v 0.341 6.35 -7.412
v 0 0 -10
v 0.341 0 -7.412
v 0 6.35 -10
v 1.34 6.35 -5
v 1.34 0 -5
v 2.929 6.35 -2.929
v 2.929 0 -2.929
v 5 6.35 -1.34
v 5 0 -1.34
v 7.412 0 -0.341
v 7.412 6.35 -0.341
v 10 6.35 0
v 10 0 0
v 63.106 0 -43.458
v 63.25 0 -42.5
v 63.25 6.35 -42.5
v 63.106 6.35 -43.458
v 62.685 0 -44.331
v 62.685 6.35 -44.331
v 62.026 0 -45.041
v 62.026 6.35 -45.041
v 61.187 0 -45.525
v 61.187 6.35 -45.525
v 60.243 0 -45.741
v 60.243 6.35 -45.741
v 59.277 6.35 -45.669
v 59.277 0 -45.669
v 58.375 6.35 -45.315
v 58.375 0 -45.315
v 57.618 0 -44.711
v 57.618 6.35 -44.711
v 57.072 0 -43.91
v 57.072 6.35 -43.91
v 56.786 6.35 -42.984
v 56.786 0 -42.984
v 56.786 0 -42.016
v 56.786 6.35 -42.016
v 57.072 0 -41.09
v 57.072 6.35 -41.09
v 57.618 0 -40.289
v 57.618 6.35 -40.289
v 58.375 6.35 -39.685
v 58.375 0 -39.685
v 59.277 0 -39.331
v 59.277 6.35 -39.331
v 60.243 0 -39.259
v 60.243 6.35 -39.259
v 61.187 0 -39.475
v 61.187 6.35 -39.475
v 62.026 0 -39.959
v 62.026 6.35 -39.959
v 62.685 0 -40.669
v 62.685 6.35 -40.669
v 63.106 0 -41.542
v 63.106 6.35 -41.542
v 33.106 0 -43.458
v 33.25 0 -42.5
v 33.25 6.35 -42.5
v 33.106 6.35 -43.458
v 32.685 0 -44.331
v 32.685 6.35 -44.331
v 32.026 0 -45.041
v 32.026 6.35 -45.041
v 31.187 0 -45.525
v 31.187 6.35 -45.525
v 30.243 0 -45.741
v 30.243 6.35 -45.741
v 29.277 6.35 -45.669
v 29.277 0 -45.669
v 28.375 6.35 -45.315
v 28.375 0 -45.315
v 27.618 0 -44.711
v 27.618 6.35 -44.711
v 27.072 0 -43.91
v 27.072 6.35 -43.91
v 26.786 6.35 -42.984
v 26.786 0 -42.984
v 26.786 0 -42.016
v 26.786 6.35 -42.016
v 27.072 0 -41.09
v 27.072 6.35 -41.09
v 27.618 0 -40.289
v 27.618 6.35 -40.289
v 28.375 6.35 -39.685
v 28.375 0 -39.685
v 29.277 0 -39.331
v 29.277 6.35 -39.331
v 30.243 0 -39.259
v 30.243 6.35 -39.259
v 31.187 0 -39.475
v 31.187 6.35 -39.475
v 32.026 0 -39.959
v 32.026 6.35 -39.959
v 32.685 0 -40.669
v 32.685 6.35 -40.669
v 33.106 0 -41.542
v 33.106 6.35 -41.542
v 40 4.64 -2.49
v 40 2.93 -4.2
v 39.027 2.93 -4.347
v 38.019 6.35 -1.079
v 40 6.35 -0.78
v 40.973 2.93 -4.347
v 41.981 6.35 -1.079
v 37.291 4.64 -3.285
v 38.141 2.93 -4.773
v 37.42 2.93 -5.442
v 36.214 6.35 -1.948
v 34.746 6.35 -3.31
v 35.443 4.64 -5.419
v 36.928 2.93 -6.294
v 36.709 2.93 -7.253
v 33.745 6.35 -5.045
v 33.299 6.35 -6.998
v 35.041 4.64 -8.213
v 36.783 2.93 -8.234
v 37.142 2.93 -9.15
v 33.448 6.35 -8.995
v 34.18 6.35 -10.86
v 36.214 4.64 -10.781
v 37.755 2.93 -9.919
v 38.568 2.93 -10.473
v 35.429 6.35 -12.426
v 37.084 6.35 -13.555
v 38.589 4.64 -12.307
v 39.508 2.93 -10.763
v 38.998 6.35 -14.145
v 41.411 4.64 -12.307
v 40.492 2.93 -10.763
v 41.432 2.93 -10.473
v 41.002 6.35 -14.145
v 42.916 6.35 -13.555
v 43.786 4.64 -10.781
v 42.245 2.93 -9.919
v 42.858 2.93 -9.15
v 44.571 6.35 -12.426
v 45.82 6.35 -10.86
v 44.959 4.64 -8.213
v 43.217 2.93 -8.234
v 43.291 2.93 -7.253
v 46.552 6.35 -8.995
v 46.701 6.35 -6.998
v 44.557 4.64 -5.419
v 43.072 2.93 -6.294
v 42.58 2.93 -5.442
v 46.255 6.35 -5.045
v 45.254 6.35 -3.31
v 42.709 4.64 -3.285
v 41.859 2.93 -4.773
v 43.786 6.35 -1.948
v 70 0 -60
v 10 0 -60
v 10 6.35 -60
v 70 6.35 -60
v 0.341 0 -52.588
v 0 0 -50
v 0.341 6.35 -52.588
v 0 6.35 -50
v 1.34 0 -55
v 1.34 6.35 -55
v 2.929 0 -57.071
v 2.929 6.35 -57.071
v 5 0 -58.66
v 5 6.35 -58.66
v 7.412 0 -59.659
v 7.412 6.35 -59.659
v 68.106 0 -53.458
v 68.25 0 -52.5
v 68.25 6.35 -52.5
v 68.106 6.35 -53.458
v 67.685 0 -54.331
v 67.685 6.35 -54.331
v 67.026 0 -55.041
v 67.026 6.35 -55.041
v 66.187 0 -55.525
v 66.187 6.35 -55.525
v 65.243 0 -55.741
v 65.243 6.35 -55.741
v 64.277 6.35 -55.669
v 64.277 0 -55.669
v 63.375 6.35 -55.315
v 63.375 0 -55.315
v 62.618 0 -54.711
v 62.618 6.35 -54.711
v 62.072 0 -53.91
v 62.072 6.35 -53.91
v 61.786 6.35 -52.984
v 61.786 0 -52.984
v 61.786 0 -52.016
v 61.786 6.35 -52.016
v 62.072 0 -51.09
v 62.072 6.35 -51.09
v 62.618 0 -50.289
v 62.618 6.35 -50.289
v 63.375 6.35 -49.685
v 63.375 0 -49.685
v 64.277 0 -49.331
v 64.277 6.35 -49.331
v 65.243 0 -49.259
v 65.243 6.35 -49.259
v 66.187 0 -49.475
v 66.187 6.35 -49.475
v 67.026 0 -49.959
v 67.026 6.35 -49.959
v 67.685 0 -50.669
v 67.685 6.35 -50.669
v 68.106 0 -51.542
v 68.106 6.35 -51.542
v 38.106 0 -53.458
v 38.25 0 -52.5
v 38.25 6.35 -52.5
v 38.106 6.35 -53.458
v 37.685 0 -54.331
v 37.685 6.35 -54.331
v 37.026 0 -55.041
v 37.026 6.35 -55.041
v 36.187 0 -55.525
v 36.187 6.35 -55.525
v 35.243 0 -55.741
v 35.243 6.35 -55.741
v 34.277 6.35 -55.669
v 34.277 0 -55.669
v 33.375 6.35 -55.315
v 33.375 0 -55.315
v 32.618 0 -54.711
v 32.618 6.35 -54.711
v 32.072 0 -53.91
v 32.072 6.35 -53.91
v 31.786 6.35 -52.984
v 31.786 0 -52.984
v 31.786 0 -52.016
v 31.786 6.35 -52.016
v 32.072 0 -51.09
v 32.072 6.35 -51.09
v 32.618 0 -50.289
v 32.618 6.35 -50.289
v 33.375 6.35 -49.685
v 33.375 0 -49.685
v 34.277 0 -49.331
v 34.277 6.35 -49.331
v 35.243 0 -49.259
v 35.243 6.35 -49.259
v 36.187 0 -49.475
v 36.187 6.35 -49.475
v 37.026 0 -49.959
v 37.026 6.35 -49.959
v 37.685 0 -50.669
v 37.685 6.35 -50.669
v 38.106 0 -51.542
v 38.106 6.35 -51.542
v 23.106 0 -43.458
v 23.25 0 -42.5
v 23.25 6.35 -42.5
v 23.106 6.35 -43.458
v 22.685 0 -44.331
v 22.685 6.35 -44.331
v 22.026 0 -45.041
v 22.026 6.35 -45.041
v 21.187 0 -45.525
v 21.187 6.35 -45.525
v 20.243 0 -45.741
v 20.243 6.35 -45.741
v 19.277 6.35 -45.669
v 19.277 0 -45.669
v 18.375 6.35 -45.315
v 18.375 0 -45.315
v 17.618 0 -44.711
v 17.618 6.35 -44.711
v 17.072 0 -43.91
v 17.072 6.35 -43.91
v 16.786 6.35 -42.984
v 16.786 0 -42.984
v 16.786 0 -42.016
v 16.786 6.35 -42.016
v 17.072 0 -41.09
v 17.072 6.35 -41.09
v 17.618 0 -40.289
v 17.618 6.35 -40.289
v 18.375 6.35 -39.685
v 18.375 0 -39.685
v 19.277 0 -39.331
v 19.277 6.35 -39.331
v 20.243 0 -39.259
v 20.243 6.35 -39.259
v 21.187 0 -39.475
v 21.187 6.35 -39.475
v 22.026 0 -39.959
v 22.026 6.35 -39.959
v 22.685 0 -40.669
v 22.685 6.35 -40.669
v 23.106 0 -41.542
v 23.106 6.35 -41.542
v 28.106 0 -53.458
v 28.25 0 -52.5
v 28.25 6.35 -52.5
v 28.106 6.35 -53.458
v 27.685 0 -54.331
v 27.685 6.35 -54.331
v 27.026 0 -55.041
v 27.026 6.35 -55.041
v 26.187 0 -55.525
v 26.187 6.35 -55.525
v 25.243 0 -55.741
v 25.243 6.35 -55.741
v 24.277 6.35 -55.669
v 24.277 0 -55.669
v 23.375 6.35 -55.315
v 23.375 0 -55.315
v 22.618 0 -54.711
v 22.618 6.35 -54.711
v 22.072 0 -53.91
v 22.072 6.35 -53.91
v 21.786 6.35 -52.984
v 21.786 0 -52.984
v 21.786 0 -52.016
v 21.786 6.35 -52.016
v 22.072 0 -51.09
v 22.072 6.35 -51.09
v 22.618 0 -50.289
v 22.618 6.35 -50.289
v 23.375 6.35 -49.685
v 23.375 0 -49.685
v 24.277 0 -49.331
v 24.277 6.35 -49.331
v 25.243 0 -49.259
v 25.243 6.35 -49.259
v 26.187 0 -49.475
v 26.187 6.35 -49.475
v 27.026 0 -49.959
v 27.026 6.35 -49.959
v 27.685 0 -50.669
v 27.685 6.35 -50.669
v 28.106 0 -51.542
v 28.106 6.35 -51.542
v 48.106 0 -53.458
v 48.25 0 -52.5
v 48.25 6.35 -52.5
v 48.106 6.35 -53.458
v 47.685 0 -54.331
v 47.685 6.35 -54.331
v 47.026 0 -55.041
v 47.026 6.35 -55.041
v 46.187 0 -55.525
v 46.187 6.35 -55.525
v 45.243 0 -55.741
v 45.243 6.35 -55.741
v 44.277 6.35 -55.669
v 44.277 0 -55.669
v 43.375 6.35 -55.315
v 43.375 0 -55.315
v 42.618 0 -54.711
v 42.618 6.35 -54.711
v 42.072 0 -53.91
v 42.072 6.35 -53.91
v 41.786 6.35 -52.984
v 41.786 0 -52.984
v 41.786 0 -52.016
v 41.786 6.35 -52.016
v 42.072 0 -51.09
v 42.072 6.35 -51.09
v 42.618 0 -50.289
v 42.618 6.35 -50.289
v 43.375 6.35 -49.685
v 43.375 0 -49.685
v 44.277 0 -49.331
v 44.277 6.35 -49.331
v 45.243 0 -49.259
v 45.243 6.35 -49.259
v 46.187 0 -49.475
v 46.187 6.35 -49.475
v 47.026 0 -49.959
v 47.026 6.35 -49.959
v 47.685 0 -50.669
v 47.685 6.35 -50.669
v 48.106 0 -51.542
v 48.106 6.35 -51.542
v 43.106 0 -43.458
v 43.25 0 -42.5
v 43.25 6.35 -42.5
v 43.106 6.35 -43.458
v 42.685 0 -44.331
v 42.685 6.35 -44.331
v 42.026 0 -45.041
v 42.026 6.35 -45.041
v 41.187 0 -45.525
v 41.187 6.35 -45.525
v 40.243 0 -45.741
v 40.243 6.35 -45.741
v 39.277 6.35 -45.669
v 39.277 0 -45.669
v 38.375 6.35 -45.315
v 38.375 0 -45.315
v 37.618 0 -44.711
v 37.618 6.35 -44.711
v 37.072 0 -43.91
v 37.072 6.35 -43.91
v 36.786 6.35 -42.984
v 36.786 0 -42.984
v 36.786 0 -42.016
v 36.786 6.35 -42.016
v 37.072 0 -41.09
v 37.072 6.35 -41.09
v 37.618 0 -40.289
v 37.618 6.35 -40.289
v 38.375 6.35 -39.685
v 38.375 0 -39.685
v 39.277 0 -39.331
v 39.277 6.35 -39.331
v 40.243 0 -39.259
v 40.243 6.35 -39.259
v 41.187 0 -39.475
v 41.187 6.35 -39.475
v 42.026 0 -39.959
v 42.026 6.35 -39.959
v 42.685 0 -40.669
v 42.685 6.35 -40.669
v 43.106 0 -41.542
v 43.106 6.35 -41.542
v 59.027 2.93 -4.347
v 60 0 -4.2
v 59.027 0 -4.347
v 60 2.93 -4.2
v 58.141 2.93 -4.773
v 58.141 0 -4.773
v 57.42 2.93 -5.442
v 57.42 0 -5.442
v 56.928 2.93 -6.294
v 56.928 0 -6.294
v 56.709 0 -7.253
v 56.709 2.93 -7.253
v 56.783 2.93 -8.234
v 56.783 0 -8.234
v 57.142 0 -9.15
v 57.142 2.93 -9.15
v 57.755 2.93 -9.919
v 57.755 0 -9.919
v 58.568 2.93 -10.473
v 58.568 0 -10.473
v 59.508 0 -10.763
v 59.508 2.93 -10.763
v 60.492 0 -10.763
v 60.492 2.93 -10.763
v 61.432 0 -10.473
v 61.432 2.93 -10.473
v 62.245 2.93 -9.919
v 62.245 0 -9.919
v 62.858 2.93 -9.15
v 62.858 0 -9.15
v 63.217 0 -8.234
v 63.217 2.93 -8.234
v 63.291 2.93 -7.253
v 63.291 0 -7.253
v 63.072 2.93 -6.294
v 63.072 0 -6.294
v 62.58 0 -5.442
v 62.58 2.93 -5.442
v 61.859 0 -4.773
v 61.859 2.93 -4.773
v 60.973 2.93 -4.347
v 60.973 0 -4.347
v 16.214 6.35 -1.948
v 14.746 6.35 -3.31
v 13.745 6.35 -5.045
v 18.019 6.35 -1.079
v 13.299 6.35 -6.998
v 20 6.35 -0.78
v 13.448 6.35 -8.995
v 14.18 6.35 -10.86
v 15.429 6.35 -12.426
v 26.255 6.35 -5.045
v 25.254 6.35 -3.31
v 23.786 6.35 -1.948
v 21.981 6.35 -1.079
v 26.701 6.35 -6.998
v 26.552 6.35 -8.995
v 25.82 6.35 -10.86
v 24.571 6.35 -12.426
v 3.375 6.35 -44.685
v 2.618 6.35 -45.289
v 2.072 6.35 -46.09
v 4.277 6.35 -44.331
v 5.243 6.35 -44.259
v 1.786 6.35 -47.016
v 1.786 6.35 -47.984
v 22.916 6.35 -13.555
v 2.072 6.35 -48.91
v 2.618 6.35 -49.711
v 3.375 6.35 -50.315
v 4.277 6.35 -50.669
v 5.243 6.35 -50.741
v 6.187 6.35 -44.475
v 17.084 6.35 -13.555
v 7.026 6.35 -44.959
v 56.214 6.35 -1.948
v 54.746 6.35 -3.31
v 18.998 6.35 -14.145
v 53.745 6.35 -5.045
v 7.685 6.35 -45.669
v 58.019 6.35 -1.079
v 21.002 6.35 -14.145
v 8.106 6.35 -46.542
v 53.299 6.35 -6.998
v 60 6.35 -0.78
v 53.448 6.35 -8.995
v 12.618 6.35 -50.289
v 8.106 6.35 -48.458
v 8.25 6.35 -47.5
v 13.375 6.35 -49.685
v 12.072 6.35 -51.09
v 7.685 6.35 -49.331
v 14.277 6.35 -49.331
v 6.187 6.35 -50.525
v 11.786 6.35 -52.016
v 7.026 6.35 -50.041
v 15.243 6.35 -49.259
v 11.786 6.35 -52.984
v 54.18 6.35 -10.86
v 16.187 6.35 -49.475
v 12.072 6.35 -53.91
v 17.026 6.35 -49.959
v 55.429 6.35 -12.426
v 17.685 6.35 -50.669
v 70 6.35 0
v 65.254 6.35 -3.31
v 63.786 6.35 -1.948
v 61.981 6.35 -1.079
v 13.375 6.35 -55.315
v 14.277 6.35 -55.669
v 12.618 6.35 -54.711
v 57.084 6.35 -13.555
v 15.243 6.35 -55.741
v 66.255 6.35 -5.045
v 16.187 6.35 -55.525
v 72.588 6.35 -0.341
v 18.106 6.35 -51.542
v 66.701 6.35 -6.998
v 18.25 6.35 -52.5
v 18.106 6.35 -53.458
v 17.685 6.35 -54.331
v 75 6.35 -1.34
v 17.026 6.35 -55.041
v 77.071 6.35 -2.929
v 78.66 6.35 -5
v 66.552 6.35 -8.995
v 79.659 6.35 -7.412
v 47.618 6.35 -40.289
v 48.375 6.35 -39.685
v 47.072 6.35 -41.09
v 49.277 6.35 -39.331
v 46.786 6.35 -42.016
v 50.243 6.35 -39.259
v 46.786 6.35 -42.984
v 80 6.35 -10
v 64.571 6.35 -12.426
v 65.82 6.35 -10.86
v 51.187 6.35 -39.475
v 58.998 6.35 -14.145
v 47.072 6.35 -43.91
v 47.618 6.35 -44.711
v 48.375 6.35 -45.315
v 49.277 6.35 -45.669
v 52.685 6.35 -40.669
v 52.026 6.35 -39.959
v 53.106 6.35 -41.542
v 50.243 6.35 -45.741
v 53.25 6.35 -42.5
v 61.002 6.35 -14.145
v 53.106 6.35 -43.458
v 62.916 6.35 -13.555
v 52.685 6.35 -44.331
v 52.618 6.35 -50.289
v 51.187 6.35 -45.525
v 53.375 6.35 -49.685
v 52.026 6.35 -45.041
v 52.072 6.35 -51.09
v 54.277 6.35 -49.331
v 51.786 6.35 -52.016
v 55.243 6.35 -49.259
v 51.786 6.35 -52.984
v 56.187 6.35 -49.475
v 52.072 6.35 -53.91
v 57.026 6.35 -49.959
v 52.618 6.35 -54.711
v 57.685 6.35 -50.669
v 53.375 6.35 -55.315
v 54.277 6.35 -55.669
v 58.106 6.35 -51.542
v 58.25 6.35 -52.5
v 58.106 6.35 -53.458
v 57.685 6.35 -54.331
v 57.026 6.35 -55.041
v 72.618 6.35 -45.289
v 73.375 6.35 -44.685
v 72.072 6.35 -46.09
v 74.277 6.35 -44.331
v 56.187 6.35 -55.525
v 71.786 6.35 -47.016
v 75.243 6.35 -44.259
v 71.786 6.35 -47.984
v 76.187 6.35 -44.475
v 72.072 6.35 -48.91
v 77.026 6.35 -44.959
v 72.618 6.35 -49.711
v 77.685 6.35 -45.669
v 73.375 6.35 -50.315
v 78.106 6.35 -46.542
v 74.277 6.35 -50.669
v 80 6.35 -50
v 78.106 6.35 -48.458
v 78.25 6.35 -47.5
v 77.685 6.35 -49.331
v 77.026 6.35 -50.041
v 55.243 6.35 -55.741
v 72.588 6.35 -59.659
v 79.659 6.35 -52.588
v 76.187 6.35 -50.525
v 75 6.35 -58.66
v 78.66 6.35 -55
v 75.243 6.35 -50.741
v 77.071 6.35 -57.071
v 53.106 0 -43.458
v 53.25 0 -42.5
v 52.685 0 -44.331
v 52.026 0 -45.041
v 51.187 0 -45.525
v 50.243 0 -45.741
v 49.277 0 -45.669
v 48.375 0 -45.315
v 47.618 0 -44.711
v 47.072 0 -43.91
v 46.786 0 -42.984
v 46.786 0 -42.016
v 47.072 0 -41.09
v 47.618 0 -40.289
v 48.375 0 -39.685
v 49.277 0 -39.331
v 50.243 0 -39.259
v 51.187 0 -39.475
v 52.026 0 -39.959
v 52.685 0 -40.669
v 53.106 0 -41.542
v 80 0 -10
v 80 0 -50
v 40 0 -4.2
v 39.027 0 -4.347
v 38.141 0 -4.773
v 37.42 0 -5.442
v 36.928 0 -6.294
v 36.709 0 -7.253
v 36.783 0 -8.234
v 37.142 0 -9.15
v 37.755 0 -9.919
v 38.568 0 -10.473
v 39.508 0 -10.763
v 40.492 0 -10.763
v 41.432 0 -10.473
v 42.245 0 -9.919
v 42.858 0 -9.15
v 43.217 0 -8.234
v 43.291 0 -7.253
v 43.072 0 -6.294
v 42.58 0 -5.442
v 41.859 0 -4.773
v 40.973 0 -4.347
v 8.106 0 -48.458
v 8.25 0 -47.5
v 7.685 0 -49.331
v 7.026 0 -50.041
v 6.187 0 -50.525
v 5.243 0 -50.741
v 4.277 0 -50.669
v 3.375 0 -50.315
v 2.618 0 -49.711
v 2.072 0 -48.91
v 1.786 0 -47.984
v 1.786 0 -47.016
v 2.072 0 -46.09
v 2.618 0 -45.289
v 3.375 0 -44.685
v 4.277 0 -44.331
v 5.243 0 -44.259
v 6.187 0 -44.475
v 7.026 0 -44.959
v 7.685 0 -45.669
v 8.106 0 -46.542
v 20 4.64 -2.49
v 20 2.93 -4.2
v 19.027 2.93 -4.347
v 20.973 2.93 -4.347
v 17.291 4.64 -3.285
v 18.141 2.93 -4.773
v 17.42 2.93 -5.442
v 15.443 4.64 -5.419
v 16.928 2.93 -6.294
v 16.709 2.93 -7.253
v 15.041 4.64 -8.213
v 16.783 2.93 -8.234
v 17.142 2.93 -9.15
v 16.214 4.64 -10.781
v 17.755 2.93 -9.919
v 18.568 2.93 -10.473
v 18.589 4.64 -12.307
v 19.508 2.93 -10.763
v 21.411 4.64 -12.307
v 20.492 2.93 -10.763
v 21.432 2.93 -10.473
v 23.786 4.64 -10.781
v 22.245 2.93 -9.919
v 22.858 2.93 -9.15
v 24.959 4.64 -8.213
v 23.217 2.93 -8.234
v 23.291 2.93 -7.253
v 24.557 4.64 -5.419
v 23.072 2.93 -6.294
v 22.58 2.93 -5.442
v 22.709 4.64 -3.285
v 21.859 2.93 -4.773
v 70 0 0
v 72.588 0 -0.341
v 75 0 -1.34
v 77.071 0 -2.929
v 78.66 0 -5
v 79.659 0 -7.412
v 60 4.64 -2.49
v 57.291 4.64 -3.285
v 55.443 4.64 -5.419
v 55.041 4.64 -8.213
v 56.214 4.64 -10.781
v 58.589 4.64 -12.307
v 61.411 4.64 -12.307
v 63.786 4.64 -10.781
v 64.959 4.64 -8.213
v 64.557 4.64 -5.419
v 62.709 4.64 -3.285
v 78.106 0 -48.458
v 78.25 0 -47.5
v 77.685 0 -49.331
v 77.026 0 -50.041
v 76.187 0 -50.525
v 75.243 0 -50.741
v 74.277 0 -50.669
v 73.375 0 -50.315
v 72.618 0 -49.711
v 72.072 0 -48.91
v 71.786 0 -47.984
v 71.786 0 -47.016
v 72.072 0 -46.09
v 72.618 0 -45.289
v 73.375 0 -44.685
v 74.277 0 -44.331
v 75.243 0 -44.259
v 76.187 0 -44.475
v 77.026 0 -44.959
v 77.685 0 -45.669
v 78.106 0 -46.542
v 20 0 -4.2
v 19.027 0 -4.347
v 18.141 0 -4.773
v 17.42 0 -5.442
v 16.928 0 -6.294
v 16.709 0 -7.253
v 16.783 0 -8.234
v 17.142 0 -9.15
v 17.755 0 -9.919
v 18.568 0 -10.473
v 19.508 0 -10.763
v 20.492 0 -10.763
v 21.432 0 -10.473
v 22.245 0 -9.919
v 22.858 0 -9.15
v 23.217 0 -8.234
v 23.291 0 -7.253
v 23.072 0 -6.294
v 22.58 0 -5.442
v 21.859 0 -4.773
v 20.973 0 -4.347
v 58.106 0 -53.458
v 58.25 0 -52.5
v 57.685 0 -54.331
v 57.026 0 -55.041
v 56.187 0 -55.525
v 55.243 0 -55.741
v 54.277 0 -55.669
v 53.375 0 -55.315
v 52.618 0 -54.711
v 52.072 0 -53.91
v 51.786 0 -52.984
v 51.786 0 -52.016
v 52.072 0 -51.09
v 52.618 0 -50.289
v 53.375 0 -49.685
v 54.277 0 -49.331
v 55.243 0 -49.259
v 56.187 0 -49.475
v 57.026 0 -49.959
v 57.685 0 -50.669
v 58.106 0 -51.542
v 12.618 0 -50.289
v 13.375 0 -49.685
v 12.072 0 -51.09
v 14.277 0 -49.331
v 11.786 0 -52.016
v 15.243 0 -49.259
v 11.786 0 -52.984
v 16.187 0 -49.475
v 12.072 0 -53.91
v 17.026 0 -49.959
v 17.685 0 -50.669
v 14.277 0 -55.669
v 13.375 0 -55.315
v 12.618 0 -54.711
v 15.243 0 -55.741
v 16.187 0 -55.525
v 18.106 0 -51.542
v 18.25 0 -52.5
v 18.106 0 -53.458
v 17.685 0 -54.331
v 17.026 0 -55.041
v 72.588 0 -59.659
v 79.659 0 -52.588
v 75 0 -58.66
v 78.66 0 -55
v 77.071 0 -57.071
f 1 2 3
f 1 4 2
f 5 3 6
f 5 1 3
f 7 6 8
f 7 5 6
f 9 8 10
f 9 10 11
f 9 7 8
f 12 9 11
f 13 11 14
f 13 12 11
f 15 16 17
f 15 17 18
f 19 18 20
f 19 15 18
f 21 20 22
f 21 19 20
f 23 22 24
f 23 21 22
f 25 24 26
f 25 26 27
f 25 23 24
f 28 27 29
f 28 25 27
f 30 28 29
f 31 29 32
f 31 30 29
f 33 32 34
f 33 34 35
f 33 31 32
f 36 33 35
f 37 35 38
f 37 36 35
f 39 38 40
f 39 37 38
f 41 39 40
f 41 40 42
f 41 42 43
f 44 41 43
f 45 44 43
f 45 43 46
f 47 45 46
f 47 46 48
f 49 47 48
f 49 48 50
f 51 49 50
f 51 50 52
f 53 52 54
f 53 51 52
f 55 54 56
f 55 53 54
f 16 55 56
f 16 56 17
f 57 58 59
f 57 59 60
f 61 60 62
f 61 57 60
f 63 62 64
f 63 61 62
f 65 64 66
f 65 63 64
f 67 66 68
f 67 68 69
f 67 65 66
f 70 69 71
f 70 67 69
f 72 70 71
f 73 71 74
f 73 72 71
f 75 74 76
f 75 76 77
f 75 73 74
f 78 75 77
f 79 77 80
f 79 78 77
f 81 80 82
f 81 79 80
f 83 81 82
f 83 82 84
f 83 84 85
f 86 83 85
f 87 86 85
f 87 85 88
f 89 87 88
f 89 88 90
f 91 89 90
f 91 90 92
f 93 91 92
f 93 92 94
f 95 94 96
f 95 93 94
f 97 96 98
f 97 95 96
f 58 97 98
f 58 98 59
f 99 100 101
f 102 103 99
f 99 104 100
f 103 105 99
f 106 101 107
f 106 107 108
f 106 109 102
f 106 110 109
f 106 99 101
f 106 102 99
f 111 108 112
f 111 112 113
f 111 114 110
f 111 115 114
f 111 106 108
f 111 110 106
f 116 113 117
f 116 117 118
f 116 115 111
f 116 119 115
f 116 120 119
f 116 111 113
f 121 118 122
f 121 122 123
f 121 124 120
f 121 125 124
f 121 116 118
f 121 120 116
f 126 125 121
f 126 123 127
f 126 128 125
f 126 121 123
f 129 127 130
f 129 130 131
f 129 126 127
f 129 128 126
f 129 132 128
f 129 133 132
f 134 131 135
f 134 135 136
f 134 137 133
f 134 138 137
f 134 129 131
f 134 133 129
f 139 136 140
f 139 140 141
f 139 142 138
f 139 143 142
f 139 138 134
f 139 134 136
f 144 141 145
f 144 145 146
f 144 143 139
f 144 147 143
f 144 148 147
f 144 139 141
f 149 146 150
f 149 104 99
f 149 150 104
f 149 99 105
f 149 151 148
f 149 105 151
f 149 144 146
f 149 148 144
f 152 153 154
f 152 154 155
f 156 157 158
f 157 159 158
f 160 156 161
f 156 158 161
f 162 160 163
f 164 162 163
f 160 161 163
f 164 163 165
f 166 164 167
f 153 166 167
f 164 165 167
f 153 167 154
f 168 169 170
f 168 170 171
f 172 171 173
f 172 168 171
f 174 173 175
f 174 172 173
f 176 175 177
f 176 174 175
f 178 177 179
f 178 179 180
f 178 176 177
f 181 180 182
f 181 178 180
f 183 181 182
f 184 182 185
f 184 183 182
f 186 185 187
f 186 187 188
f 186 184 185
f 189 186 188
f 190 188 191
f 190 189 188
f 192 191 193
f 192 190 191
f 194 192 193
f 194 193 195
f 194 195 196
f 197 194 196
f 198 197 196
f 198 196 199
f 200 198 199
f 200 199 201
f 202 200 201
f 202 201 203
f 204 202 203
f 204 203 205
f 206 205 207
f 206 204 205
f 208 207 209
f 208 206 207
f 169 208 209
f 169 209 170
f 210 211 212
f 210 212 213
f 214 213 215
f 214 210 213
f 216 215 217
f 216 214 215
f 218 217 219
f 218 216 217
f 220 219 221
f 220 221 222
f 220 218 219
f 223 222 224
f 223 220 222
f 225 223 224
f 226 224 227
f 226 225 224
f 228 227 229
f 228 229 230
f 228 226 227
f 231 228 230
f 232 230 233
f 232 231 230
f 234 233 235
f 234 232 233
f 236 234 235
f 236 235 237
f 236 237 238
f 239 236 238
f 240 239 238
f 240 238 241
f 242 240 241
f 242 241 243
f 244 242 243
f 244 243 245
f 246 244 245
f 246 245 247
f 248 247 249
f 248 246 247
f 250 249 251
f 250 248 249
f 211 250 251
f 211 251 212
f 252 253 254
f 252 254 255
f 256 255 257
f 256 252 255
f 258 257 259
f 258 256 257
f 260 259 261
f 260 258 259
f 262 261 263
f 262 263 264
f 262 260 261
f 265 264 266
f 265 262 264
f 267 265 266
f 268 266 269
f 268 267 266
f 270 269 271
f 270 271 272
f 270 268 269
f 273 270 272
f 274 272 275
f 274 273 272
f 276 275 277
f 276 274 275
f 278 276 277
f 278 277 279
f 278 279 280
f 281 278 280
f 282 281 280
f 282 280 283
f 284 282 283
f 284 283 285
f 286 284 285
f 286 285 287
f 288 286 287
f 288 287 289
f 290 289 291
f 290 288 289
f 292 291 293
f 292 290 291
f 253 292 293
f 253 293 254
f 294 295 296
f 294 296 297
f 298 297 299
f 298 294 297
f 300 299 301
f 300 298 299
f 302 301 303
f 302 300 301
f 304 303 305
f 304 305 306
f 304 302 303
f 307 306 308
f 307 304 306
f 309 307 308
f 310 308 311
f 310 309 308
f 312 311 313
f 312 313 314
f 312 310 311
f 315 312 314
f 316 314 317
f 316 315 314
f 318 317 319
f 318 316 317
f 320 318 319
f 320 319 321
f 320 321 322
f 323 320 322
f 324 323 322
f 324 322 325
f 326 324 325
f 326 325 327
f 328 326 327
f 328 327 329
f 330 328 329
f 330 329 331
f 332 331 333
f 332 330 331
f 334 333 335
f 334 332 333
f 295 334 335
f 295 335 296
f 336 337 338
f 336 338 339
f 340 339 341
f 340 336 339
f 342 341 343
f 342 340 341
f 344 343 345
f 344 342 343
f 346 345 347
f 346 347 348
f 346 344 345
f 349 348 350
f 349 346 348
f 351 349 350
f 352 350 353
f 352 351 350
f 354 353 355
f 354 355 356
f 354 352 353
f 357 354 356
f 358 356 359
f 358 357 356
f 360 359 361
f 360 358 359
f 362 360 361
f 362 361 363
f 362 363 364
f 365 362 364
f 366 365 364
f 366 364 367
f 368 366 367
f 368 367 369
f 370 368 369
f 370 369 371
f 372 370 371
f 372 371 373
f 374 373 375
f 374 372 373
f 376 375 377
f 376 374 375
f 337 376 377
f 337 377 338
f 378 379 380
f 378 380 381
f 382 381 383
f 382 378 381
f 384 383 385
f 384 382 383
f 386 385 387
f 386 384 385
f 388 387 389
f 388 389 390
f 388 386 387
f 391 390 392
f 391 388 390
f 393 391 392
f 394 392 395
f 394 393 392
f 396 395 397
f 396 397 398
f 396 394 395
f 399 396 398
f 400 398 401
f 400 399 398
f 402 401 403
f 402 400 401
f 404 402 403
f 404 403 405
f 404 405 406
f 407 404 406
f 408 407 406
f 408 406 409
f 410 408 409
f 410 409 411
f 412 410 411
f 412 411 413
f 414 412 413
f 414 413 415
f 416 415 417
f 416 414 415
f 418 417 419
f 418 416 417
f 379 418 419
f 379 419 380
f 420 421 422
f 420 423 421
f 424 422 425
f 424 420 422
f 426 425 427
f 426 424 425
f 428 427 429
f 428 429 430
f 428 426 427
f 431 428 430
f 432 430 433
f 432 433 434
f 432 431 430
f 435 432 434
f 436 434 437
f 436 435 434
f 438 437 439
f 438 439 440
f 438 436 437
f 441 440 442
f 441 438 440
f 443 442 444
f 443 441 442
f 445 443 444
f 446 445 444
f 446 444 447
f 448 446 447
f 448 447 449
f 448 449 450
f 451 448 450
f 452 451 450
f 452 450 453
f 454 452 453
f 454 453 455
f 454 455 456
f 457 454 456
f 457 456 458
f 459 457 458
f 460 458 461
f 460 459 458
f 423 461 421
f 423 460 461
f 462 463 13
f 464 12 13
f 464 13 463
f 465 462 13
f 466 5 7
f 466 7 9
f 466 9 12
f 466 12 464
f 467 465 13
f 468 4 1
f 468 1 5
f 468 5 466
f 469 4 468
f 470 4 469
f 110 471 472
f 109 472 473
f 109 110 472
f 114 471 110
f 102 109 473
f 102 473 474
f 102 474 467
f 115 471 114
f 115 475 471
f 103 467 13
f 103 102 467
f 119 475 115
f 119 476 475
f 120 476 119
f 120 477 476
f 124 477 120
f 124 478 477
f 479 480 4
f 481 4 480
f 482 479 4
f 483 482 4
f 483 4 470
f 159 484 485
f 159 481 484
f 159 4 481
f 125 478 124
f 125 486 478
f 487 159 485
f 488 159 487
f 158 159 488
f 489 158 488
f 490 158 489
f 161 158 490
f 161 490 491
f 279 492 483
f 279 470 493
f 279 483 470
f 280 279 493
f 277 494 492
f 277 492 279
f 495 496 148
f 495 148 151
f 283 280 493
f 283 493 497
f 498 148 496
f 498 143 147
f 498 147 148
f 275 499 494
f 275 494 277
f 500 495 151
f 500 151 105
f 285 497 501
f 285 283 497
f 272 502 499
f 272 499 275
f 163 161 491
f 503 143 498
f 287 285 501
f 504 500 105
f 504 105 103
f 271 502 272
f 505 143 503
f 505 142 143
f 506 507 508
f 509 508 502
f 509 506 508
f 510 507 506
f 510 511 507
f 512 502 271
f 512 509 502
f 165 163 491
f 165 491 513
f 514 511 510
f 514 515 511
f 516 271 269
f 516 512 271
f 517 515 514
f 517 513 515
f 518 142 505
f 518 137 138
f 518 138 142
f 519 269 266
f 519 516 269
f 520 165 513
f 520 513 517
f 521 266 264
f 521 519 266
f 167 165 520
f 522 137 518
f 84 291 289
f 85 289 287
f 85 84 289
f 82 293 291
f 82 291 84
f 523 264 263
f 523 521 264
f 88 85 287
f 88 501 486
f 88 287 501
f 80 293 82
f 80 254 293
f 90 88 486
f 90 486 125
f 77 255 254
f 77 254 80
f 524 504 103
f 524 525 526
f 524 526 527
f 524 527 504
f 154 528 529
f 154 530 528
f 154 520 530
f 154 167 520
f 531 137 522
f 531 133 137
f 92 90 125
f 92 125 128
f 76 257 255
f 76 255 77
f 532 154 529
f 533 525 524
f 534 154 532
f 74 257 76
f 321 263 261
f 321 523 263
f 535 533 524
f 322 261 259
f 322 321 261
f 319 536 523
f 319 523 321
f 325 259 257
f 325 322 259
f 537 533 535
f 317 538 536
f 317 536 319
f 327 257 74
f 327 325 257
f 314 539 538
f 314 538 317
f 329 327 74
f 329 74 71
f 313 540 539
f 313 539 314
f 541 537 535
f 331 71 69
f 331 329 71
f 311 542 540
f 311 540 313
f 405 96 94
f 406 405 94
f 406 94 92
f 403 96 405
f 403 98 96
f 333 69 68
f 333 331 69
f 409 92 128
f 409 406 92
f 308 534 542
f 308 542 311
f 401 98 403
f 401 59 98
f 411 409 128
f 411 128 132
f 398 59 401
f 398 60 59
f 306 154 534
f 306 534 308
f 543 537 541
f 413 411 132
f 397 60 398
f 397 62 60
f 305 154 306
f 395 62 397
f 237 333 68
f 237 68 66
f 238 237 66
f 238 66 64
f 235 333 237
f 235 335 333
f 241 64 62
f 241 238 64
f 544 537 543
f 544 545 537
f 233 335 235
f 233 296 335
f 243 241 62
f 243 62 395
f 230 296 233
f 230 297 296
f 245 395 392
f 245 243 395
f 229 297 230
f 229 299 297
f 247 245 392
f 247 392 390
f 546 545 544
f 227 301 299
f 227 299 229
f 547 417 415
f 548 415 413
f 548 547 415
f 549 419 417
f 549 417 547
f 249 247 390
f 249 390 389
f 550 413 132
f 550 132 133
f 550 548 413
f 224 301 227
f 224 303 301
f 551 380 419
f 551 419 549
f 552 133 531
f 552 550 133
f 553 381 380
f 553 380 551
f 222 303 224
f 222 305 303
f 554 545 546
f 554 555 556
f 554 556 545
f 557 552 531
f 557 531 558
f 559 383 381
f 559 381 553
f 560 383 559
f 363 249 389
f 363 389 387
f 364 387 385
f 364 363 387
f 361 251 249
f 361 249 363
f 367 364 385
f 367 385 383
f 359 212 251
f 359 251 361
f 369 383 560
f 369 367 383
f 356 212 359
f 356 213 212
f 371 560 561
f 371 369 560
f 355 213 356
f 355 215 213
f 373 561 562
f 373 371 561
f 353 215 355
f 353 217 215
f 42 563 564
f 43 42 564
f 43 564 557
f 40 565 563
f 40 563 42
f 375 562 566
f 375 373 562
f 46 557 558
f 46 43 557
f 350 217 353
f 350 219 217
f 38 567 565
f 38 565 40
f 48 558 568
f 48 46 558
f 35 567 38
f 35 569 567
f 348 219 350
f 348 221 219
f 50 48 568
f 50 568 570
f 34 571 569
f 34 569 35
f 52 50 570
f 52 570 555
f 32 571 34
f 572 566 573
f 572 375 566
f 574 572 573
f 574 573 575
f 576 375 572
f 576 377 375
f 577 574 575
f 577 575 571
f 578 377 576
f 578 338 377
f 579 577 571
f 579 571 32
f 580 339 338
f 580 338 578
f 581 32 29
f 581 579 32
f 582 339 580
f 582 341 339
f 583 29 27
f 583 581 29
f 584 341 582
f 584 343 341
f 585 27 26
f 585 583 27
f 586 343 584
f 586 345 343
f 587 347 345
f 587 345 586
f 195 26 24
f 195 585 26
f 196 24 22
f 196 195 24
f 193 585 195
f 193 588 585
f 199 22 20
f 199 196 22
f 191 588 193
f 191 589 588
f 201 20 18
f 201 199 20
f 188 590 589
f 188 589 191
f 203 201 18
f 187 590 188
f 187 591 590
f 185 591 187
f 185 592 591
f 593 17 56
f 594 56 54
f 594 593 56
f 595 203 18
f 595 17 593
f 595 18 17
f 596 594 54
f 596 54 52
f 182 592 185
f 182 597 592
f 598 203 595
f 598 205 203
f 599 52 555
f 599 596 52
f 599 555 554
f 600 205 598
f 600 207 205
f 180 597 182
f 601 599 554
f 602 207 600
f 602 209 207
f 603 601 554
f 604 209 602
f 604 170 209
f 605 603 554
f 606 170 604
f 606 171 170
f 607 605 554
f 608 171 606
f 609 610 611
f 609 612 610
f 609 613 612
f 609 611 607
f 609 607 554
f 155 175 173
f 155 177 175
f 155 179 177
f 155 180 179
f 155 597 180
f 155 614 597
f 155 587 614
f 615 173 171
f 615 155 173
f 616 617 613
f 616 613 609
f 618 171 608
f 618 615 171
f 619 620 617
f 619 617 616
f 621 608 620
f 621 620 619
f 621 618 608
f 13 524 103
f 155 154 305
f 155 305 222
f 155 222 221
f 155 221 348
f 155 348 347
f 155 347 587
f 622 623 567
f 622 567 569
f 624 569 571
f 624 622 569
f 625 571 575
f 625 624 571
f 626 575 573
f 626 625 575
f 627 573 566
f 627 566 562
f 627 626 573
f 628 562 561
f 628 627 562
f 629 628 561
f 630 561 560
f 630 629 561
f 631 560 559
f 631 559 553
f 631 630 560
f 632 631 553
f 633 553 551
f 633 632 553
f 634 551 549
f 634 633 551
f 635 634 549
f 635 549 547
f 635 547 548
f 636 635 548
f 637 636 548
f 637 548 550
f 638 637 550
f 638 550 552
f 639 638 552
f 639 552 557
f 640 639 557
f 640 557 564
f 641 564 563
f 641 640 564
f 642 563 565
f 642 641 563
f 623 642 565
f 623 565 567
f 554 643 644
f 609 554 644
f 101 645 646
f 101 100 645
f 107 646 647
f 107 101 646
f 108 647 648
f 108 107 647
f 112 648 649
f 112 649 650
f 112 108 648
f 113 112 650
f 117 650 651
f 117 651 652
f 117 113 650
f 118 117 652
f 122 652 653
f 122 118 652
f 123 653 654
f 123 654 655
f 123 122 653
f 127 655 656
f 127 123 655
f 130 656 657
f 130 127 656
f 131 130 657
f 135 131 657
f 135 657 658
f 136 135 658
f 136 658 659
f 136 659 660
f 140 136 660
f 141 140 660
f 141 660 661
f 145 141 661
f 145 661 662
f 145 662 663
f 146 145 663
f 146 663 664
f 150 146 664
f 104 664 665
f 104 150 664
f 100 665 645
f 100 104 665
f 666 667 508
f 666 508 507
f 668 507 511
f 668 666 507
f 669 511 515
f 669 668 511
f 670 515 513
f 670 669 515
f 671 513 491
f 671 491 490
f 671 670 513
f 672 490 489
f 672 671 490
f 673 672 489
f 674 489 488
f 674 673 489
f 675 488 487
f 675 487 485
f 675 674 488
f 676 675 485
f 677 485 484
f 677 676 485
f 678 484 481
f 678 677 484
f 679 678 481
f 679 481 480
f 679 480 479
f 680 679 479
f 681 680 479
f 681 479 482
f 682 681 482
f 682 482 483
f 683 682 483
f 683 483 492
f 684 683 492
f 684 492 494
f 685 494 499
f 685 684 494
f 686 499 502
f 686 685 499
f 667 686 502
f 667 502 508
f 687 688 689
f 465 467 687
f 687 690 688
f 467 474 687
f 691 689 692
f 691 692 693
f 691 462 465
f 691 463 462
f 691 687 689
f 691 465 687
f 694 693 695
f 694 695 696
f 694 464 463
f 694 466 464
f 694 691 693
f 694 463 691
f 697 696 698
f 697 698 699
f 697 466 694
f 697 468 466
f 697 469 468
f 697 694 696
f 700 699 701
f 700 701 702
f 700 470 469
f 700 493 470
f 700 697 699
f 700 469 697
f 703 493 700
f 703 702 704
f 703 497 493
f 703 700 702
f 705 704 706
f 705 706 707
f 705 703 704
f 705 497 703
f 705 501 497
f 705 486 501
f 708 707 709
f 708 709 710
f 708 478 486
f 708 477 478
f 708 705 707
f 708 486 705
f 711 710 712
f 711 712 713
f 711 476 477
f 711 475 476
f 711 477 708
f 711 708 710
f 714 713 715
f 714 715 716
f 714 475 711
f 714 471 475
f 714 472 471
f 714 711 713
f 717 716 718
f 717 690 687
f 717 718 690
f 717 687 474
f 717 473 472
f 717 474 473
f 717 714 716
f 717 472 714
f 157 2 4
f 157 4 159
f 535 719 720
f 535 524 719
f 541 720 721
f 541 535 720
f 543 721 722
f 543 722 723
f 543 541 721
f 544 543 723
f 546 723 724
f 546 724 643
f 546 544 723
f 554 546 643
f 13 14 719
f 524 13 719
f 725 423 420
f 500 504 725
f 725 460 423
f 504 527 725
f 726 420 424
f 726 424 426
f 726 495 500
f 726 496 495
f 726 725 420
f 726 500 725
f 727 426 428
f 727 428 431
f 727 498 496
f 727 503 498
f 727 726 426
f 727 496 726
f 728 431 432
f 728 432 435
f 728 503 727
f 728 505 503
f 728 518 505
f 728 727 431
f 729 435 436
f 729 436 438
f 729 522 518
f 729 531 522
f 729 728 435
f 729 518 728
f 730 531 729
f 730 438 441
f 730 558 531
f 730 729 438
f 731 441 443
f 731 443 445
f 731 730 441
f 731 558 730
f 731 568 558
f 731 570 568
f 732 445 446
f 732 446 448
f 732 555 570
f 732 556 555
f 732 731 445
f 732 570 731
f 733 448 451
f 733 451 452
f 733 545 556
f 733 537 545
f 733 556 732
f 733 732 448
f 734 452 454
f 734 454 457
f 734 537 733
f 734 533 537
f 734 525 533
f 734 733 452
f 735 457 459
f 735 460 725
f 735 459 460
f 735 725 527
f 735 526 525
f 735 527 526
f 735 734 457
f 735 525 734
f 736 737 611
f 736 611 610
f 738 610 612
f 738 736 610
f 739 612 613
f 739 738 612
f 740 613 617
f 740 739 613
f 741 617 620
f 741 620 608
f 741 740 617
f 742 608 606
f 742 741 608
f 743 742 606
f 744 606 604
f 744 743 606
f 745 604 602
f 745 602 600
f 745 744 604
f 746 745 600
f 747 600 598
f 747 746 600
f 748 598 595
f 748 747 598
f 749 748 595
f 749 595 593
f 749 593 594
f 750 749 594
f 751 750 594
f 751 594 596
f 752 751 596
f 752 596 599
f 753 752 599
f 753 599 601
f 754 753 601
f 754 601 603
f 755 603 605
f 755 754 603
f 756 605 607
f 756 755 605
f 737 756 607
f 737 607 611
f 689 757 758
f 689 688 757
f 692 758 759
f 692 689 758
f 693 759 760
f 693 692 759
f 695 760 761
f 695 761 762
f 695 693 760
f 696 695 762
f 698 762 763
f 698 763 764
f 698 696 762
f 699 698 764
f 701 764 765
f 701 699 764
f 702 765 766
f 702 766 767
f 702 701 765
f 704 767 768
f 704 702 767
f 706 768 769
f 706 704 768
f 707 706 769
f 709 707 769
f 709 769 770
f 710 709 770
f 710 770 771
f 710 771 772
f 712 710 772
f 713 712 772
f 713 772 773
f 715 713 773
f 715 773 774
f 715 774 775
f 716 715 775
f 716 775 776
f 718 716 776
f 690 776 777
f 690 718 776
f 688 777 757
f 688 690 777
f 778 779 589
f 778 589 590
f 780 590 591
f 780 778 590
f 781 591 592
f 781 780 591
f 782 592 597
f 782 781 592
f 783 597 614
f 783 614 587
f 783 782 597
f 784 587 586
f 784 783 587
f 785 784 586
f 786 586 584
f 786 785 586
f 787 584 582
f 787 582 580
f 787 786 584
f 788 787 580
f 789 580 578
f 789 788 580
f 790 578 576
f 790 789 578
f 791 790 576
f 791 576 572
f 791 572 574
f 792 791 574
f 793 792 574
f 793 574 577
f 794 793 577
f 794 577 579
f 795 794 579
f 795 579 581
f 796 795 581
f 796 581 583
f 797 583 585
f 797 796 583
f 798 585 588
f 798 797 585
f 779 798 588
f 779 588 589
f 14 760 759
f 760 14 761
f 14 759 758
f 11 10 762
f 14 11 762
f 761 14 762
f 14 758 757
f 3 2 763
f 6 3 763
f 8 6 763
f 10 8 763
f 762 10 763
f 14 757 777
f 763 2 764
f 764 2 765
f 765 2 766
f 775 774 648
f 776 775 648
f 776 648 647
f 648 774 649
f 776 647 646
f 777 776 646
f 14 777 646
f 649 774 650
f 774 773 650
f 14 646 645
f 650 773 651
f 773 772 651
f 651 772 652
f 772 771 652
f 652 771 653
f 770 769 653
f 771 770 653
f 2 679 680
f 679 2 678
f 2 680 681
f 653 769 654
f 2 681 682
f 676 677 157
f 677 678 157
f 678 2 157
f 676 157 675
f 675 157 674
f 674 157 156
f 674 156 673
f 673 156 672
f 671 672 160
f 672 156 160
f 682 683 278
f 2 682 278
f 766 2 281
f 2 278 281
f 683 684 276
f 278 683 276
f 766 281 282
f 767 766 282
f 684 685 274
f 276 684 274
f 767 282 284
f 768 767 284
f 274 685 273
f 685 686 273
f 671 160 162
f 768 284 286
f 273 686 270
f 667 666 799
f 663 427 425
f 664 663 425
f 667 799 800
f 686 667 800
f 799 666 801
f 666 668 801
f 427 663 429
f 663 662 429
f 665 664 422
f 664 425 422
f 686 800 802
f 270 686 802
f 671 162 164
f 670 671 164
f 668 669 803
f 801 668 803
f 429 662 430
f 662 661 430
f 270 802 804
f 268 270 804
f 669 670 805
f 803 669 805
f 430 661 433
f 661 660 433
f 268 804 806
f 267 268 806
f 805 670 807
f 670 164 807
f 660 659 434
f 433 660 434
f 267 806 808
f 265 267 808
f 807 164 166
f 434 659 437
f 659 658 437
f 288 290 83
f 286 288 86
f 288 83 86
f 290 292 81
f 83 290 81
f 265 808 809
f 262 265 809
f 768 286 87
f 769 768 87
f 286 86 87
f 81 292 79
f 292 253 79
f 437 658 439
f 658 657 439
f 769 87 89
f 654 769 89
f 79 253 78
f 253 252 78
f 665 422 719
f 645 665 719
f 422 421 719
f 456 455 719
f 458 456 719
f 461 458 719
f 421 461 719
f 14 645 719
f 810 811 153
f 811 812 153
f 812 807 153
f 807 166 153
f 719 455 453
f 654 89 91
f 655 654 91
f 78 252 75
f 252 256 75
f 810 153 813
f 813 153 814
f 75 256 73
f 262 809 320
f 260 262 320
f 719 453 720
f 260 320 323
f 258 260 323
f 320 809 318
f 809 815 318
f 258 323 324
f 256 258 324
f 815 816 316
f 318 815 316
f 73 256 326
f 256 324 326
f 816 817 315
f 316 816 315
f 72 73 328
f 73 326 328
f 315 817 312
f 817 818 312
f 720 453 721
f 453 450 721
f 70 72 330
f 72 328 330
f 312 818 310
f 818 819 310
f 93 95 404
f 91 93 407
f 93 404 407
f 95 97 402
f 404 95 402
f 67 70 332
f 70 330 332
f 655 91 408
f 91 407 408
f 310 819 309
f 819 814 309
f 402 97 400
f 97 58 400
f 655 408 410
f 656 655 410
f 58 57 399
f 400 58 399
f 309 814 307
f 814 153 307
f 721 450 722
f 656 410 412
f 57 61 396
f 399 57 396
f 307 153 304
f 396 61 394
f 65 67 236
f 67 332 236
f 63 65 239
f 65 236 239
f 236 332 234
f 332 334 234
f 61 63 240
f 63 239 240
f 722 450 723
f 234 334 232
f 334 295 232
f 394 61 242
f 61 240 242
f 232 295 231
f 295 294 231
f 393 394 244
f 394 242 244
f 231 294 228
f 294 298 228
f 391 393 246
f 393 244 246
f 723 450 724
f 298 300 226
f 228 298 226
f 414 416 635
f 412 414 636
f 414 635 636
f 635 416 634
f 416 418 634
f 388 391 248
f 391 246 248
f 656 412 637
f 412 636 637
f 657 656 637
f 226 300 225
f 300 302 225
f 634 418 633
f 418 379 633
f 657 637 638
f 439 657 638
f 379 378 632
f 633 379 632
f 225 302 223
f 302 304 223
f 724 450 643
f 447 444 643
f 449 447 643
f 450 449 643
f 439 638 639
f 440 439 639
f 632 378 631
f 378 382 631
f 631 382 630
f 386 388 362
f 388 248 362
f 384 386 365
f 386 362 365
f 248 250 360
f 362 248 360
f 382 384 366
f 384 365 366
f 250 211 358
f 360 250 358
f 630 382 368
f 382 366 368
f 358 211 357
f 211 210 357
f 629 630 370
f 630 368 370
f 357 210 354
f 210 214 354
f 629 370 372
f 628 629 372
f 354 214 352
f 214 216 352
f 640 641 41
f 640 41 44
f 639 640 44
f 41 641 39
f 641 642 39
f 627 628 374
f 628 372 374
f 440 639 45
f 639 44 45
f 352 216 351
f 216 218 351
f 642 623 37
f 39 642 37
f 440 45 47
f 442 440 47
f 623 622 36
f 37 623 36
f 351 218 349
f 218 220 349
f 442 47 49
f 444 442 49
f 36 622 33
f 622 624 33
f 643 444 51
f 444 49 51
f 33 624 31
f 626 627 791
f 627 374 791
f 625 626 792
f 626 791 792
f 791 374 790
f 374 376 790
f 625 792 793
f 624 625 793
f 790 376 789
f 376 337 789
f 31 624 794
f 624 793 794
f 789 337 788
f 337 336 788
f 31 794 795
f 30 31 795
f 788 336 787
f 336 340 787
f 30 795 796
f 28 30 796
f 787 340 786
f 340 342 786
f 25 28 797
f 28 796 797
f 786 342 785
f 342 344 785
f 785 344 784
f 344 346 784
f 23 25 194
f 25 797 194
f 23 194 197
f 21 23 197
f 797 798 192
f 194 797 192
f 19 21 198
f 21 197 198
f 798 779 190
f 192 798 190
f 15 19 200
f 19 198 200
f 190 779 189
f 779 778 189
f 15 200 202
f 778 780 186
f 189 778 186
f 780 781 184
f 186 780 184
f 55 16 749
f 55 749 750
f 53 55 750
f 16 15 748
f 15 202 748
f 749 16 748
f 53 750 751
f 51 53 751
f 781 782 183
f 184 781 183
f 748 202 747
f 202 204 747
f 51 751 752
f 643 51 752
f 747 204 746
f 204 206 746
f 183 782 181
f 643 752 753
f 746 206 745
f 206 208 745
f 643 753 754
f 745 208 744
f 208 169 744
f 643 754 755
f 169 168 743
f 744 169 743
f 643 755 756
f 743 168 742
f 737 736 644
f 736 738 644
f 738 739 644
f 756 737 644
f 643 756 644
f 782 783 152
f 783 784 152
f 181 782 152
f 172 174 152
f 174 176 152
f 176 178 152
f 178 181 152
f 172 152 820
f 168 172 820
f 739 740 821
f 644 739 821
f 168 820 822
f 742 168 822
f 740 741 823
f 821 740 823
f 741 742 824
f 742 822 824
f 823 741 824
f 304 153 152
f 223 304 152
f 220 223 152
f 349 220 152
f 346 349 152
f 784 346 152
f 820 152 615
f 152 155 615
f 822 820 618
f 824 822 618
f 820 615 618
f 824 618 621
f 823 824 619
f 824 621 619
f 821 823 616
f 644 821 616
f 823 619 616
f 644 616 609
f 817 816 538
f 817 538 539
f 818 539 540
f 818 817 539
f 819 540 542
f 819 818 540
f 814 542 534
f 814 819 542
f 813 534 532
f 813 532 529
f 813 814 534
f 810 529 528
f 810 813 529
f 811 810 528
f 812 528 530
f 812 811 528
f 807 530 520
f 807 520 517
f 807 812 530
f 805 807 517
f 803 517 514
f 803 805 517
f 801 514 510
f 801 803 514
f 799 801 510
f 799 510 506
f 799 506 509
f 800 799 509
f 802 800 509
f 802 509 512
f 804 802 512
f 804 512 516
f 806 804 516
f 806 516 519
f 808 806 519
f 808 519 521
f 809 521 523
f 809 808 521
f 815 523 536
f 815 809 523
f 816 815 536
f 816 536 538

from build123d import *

# Parameters (mm, degrees)
SKETCH1_W                    = 80
SKETCH1_H                    = 60
SKETCH1_R                    = 3.1
SKETCH1_R_2                  = 3.25
BOSS_EXTRUDE1_DEPTH          = 6.35
FILLET1_R                    = 10
CSK_FOR_M6_SFHCS1_AT_2_COUNT = 2
CSK_FOR_M6_SFHCS1_AT_2_PITCH = 20
CSK_FOR_M6_SFHCS1_AT_3_COUNT = 2
CSK_FOR_M6_SFHCS1_AT_3_PITCH = 40


with BuildPart() as part:
    # Sketch1 → Boss-Extrude1 (new body)
    with BuildSketch(Plane(origin=(0, 0, 0), x_dir=(1, 0, 0), z_dir=(0, 1, 0))):
        with Locations((40, 30)):
            Rectangle(SKETCH1_W, SKETCH1_H)
        with Locations((40, 7.5)):
            Circle(SKETCH1_R, mode=Mode.SUBTRACT)
        with Locations((20, 7.5)):
            Circle(SKETCH1_R, mode=Mode.SUBTRACT)
        with Locations((60, 7.5)):
            Circle(SKETCH1_R, mode=Mode.SUBTRACT)
        with Locations((35, 52.5)):
            Circle(SKETCH1_R_2, mode=Mode.SUBTRACT)
        with Locations((45, 52.5)):
            Circle(SKETCH1_R_2, mode=Mode.SUBTRACT)
        with Locations((25, 52.5)):
            Circle(SKETCH1_R_2, mode=Mode.SUBTRACT)
        with Locations((30, 42.5)):
            Circle(SKETCH1_R_2, mode=Mode.SUBTRACT)
        with Locations((40, 42.5)):
            Circle(SKETCH1_R_2, mode=Mode.SUBTRACT)
        with Locations((50, 42.5)):
            Circle(SKETCH1_R_2, mode=Mode.SUBTRACT)
        with Locations((20, 42.5)):
            Circle(SKETCH1_R_2, mode=Mode.SUBTRACT)
        with Locations((15, 52.5)):
            Circle(SKETCH1_R_2, mode=Mode.SUBTRACT)
        with Locations((55, 52.5)):
            Circle(SKETCH1_R_2, mode=Mode.SUBTRACT)
        with Locations((65, 52.5)):
            Circle(SKETCH1_R_2, mode=Mode.SUBTRACT)
        with Locations((60, 42.5)):
            Circle(SKETCH1_R_2, mode=Mode.SUBTRACT)
        with Locations((75, 47.5)):
            Circle(SKETCH1_R_2, mode=Mode.SUBTRACT)
        with Locations((5, 47.5)):
            Circle(SKETCH1_R_2, mode=Mode.SUBTRACT)
    extrude(amount=BOSS_EXTRUDE1_DEPTH)

    # Fillet1
    fillet1_edges = [part.edges().sort_by_distance(p)[0] for p in [
        (0, 3.175, 0),
        (0, 3.175, -60),
        (80, 3.175, -60),
        (80, 3.175, 0),
    ]]
    fillet(fillet1_edges, radius=FILLET1_R)

    # Sketch3 → CSK for M6 SFHCS1 (revolve, cut)
    with BuildSketch(Plane(origin=(20, 6.35, -7.5), x_dir=(0, 0, 1), z_dir=(1, 0, 0))):
        Polygon((0, 0), (0, 6.35), (3.3, 6.35), (3.3, 3.42), (6.72, 0), align=None)
    csk_for_m6_sfhcs1 = revolve(axis=Axis((20, 12.7, -7.5), (0, -1, 0)), mode=Mode.SUBTRACT)

    # CSK for M6 SFHCS1 at 2: CSK for M6 SFHCS1 ×2
    with Locations(*[(i * CSK_FOR_M6_SFHCS1_AT_2_PITCH, 0, 0) for i in range(1, CSK_FOR_M6_SFHCS1_AT_2_COUNT)]):
        add(csk_for_m6_sfhcs1, mode=Mode.SUBTRACT)

    # CSK for M6 SFHCS1 at 3: CSK for M6 SFHCS1 ×2
    with Locations(*[(i * CSK_FOR_M6_SFHCS1_AT_3_PITCH, 0, 0) for i in range(1, CSK_FOR_M6_SFHCS1_AT_3_COUNT)]):
        add(csk_for_m6_sfhcs1, mode=Mode.SUBTRACT)


solid = part.part
